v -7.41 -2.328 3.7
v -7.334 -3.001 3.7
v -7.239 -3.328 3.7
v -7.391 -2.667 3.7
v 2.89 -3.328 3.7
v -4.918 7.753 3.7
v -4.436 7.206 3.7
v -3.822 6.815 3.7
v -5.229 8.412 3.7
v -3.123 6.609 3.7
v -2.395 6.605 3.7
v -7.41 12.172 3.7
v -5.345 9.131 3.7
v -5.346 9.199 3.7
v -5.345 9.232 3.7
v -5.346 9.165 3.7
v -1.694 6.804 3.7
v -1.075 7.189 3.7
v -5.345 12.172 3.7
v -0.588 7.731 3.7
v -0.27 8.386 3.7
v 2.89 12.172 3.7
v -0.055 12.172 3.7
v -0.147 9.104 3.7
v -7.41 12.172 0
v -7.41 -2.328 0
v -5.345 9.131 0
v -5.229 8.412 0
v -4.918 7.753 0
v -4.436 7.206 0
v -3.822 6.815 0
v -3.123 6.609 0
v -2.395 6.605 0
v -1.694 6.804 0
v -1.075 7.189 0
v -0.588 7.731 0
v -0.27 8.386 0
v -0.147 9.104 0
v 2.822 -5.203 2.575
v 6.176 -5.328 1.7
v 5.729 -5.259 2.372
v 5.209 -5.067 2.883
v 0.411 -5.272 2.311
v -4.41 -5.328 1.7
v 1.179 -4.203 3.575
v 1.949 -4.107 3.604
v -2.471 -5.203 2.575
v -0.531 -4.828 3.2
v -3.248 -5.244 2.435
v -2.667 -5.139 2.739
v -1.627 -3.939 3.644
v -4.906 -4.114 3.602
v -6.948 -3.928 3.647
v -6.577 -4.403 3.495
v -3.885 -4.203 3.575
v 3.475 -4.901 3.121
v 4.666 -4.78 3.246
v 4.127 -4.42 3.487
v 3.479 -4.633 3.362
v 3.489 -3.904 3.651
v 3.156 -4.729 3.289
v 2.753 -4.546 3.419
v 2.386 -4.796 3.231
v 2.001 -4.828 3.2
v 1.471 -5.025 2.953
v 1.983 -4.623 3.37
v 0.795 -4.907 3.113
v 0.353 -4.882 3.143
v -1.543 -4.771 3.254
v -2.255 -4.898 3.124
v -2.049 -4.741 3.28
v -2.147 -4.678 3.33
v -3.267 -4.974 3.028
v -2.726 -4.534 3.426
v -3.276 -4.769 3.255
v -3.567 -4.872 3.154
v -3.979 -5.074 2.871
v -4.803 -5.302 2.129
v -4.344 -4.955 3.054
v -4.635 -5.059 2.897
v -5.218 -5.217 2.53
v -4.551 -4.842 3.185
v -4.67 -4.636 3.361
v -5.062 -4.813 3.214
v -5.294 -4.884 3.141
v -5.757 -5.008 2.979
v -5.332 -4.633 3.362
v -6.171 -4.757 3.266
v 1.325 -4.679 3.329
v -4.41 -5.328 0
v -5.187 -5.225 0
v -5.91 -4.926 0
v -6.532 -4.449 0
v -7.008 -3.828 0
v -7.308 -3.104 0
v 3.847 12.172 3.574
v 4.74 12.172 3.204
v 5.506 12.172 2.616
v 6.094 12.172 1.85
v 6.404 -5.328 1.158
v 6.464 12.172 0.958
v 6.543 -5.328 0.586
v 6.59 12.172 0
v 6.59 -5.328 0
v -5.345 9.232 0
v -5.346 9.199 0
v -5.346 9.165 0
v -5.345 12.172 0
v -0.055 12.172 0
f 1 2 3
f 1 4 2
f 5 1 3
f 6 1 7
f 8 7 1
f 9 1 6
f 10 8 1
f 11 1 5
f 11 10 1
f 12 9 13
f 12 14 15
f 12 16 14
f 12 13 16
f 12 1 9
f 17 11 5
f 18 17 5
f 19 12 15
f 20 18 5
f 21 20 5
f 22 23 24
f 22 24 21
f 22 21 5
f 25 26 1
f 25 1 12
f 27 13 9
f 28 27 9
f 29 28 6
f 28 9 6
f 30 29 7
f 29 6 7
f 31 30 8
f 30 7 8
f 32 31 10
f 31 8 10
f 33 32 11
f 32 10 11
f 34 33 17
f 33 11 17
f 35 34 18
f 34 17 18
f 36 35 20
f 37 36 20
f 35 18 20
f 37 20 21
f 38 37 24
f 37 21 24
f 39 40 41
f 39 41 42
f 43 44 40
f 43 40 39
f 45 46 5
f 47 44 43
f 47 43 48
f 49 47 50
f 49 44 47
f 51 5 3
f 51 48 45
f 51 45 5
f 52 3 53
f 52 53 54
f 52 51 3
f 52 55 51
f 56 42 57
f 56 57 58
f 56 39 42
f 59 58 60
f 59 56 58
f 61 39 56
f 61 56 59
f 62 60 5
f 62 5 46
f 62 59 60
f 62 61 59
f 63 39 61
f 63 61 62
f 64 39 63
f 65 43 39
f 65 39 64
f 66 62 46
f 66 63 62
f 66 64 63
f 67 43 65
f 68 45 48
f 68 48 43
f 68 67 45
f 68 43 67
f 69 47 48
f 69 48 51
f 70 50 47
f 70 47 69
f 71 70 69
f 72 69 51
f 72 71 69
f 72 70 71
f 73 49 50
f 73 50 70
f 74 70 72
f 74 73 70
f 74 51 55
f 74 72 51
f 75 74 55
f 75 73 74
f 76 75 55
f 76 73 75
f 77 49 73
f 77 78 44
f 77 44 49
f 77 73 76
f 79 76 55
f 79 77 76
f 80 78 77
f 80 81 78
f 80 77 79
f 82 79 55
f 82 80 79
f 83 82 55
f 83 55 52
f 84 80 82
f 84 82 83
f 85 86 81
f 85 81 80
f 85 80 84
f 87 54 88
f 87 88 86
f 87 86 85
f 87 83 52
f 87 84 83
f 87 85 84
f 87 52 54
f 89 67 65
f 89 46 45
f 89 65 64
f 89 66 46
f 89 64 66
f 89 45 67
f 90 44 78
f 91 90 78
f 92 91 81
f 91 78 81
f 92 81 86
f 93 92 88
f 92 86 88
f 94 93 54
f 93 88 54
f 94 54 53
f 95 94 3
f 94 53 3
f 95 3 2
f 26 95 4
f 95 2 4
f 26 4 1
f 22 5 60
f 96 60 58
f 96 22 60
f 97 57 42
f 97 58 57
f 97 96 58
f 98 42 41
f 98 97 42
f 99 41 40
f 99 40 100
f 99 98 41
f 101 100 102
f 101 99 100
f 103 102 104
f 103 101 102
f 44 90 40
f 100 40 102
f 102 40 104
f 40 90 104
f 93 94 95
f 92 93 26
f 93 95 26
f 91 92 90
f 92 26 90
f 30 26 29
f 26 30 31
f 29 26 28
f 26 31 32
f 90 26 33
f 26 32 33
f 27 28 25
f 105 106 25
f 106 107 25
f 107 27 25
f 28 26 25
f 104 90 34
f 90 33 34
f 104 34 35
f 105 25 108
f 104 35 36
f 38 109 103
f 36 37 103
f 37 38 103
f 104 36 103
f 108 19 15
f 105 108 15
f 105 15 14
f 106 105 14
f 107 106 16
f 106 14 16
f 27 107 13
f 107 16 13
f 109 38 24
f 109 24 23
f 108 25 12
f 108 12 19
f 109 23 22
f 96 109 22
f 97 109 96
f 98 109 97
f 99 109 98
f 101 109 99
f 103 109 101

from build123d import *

# Parameters (mm, degrees)
F0_W        = 14
F0_H        = 17.5
F1_DEPTH    = 3.7
F3_DEPTH    = 5.4
F4_R        = 3.69999
F5_R        = 3
F6_T1_DEPTH = 17.30001


# Not quite as in the source:
# - a fillet or chamfer that OpenCascade refuses, or shapes differently, is made with other operations: its cross-section is extruded or revolved along the edge and cut away or added
# - a fillet or chamfer is up to 0.001 mm smaller than in the source, because OpenCascade refuses the exact size


with BuildPart() as f1:
    # F0 (on Top) → F1 (new body)
    with BuildSketch(Plane.XY):
        with Locations((-0.4103374667, 3.4223956802)):
            Rectangle(F0_W, F0_H)
    extrude(amount=F1_DEPTH)

    # F2 (on face) → F3 (cut)
    with BuildSketch(Plane.XY.offset(3.7)):
        with BuildLine():
            Line((-5.3451164257, 9.1307080224), (-5.3451164257, 9.2324278445))
            ThreePointArc((-5.3451164257, 9.2324278445), (-5.3456139214, 9.1815679334), (-5.3451164257, 9.1307080224))
        make_face()
        with BuildLine():
            Line((-5.3451164257, 12.1723956802), (-5.3451164257, 9.2324278445))
            Line((-5.3451164257, 9.2324278445), (-5.3451164257, 9.1307080224))
            ThreePointArc((-5.3451164257, 9.1307080224), (-2.7588797704, 6.5816017765), (-0.1467657558, 9.1041843944))
            Line((-0.1467657558, 9.1041843944), (-0.055406418, 12.1723956802))
            Line((-0.055406418, 12.1723956802), (-5.3451164257, 12.1723956802))
        make_face()
    extrude(amount=-F3_DEPTH, mode=Mode.SUBTRACT)

    # F4 (radius 3.7 in the source; OpenCascade refuses exactly that, so slightly less here)
    f4_edges = [f1.edges().sort_by_distance(p)[0] for p in [
        (6.589663, 3.422396, 3.7),
    ]]
    fillet(f4_edges, radius=F4_R)

    # F5
    f5_edges = [f1.edges().sort_by_distance(p)[0] for p in [
        (-7.410337, -5.327604, 1.85),
    ]]
    fillet(f5_edges, radius=F5_R)

    # F6: fillet of radius 2 on 1 edges, made by hand

    # F6_s2 → F6_t1 (cut)
    with BuildSketch(Plane.YZ.offset(-9.4103374667)):
        with BuildLine():
            add(Edge.make_bspline(
                [(-5.3276043198, 1.7), (-5.3276043198, 3.7), (-3.3276043198, 3.7)],
                knots=[0, 0, 0, 1, 1, 1], degree=2, weights=[1, 1, 1]))
            Line((-3.3276043198, 3.7), (-5.3276043198, 3.7))
            Line((-5.3276043198, 3.7), (-5.3276043198, 1.7))
        make_face()
    extrude(amount=F6_T1_DEPTH, mode=Mode.SUBTRACT)


solid = f1.part
